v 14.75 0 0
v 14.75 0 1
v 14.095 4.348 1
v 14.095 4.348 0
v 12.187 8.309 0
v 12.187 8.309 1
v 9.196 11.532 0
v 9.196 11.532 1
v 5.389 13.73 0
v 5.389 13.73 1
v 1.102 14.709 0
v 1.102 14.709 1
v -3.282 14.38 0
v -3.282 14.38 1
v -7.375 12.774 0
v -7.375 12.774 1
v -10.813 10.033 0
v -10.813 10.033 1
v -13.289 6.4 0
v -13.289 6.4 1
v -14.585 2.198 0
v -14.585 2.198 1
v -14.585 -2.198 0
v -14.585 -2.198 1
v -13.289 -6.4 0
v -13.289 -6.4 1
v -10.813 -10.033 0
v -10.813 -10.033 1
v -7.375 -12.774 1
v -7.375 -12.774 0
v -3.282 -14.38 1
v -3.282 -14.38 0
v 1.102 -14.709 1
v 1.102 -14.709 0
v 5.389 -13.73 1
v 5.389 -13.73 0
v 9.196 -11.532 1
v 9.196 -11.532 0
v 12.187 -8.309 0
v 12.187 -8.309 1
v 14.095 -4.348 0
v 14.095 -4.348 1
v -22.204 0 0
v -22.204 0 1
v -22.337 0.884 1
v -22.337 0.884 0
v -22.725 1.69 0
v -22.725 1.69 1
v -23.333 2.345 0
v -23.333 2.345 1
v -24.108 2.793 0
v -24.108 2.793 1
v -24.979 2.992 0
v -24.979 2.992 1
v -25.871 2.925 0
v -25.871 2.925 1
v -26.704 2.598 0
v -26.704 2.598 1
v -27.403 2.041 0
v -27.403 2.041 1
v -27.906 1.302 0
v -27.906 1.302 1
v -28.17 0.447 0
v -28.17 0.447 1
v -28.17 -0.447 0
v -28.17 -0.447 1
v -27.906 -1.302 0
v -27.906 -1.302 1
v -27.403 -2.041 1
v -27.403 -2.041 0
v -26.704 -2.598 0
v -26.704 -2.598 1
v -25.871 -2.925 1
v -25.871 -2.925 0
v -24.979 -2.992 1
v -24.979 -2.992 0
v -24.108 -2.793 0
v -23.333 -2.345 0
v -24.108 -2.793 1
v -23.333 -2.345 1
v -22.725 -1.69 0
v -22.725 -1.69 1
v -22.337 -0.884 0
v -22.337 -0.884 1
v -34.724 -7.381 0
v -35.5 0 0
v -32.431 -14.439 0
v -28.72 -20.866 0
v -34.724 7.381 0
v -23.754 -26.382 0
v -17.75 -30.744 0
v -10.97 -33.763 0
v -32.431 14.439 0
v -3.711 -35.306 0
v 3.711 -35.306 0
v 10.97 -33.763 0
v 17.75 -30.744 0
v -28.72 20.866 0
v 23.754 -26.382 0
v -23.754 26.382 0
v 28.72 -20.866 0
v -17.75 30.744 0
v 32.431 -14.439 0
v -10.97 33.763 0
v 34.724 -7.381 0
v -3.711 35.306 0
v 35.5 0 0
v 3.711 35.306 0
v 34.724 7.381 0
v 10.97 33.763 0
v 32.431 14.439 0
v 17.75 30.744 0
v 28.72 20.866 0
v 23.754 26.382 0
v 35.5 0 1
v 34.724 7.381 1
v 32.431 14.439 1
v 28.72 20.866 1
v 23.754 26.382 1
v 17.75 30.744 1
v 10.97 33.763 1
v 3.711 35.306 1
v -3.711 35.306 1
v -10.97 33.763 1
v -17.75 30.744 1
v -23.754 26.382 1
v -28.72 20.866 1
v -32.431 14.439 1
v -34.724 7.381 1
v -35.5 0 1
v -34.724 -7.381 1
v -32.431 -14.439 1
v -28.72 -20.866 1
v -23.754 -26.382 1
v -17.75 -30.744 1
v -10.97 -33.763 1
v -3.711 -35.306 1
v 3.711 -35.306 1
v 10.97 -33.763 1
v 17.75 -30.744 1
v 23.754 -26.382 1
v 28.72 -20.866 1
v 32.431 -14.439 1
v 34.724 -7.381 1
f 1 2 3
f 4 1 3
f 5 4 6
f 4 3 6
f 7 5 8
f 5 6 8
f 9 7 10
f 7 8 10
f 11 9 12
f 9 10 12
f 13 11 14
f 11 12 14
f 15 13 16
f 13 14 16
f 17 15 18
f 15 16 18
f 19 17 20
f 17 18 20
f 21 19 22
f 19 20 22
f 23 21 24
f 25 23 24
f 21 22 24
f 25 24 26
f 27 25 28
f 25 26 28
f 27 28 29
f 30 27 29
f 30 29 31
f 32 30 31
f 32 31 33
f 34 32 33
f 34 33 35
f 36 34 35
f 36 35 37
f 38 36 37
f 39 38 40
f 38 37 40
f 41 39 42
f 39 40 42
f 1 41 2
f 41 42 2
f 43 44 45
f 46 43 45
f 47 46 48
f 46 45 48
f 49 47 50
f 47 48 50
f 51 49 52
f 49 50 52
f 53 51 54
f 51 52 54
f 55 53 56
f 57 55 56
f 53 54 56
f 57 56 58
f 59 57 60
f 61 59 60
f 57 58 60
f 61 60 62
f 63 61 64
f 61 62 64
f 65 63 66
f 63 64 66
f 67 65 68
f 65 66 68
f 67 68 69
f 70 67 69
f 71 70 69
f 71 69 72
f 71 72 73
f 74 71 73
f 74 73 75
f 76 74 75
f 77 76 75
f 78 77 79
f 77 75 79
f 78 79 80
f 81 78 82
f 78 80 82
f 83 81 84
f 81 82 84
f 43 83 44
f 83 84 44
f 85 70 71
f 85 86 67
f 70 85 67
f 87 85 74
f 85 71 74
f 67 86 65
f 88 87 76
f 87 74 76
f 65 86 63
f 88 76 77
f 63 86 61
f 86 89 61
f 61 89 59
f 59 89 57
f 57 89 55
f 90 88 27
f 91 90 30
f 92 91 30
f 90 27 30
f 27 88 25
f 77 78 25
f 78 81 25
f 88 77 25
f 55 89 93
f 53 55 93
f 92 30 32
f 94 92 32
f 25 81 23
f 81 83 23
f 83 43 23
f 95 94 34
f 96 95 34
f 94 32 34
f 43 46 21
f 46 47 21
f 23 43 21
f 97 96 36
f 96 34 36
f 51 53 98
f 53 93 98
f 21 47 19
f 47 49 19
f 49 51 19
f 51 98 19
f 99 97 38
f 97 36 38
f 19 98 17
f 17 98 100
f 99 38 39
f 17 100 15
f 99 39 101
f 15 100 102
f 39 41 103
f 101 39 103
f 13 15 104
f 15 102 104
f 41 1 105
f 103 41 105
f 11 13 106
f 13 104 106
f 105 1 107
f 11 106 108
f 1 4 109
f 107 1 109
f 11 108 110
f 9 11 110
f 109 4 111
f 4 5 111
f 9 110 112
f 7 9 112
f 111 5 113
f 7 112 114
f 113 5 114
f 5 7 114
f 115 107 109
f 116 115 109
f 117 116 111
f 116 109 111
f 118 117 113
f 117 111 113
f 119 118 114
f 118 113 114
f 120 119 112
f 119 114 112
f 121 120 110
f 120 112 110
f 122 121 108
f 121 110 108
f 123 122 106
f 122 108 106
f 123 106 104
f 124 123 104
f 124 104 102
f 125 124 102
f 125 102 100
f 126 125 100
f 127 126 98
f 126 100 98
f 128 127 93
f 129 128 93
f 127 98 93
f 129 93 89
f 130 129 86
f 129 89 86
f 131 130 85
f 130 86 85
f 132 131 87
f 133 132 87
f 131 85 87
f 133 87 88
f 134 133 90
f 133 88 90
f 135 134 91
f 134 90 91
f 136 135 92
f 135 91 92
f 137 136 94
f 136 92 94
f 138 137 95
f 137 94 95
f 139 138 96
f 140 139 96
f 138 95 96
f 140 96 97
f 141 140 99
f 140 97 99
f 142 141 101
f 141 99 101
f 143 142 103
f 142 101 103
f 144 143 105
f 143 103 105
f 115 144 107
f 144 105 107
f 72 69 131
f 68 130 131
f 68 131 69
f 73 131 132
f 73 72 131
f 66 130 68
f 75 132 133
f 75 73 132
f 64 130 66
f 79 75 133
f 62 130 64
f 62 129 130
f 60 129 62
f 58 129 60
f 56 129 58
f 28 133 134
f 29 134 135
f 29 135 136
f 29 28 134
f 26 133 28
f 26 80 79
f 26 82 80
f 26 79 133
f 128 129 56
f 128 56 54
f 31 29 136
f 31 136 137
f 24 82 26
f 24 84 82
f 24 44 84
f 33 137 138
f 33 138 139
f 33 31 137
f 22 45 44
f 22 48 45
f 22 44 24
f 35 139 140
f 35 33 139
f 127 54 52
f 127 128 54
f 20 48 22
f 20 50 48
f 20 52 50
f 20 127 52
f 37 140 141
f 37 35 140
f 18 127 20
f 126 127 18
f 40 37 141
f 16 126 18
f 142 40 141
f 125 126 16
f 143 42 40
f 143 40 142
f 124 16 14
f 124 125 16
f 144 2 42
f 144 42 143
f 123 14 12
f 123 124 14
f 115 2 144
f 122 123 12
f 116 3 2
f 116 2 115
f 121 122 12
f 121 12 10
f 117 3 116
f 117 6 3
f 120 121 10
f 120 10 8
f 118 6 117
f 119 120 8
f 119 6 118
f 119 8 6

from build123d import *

# Parameters (mm, degrees)
ESBO_O2_R                = 35.5
RESSALTO_EXTRUS_O1_DEPTH = 1
ESBO_O3_R                = 14.75
CORTE_EXTRUS_O1_DEPTH    = 1
ESBO_O7_R                = 3
CORTE_EXTRUS_O3_DEPTH    = 1


with BuildPart() as part:
    # Esboço2 → Ressalto-extrusão1 (new body)
    with BuildSketch(Plane.XY):
        Circle(ESBO_O2_R)
    extrude(amount=RESSALTO_EXTRUS_O1_DEPTH)

    # Esboço3 → Corte-extrusão1 (cut)
    with BuildSketch(Plane.XY.offset(1)):
        Circle(ESBO_O3_R)
    extrude(amount=-CORTE_EXTRUS_O1_DEPTH, mode=Mode.SUBTRACT)

    # Esboço7 → Corte-extrusão3 (cut)
    with BuildSketch(Plane.XY.offset(1)):
        with Locations((-25.203573784, 0)):
            Circle(ESBO_O7_R)
    extrude(amount=-CORTE_EXTRUS_O3_DEPTH, mode=Mode.SUBTRACT)


solid = part.part
